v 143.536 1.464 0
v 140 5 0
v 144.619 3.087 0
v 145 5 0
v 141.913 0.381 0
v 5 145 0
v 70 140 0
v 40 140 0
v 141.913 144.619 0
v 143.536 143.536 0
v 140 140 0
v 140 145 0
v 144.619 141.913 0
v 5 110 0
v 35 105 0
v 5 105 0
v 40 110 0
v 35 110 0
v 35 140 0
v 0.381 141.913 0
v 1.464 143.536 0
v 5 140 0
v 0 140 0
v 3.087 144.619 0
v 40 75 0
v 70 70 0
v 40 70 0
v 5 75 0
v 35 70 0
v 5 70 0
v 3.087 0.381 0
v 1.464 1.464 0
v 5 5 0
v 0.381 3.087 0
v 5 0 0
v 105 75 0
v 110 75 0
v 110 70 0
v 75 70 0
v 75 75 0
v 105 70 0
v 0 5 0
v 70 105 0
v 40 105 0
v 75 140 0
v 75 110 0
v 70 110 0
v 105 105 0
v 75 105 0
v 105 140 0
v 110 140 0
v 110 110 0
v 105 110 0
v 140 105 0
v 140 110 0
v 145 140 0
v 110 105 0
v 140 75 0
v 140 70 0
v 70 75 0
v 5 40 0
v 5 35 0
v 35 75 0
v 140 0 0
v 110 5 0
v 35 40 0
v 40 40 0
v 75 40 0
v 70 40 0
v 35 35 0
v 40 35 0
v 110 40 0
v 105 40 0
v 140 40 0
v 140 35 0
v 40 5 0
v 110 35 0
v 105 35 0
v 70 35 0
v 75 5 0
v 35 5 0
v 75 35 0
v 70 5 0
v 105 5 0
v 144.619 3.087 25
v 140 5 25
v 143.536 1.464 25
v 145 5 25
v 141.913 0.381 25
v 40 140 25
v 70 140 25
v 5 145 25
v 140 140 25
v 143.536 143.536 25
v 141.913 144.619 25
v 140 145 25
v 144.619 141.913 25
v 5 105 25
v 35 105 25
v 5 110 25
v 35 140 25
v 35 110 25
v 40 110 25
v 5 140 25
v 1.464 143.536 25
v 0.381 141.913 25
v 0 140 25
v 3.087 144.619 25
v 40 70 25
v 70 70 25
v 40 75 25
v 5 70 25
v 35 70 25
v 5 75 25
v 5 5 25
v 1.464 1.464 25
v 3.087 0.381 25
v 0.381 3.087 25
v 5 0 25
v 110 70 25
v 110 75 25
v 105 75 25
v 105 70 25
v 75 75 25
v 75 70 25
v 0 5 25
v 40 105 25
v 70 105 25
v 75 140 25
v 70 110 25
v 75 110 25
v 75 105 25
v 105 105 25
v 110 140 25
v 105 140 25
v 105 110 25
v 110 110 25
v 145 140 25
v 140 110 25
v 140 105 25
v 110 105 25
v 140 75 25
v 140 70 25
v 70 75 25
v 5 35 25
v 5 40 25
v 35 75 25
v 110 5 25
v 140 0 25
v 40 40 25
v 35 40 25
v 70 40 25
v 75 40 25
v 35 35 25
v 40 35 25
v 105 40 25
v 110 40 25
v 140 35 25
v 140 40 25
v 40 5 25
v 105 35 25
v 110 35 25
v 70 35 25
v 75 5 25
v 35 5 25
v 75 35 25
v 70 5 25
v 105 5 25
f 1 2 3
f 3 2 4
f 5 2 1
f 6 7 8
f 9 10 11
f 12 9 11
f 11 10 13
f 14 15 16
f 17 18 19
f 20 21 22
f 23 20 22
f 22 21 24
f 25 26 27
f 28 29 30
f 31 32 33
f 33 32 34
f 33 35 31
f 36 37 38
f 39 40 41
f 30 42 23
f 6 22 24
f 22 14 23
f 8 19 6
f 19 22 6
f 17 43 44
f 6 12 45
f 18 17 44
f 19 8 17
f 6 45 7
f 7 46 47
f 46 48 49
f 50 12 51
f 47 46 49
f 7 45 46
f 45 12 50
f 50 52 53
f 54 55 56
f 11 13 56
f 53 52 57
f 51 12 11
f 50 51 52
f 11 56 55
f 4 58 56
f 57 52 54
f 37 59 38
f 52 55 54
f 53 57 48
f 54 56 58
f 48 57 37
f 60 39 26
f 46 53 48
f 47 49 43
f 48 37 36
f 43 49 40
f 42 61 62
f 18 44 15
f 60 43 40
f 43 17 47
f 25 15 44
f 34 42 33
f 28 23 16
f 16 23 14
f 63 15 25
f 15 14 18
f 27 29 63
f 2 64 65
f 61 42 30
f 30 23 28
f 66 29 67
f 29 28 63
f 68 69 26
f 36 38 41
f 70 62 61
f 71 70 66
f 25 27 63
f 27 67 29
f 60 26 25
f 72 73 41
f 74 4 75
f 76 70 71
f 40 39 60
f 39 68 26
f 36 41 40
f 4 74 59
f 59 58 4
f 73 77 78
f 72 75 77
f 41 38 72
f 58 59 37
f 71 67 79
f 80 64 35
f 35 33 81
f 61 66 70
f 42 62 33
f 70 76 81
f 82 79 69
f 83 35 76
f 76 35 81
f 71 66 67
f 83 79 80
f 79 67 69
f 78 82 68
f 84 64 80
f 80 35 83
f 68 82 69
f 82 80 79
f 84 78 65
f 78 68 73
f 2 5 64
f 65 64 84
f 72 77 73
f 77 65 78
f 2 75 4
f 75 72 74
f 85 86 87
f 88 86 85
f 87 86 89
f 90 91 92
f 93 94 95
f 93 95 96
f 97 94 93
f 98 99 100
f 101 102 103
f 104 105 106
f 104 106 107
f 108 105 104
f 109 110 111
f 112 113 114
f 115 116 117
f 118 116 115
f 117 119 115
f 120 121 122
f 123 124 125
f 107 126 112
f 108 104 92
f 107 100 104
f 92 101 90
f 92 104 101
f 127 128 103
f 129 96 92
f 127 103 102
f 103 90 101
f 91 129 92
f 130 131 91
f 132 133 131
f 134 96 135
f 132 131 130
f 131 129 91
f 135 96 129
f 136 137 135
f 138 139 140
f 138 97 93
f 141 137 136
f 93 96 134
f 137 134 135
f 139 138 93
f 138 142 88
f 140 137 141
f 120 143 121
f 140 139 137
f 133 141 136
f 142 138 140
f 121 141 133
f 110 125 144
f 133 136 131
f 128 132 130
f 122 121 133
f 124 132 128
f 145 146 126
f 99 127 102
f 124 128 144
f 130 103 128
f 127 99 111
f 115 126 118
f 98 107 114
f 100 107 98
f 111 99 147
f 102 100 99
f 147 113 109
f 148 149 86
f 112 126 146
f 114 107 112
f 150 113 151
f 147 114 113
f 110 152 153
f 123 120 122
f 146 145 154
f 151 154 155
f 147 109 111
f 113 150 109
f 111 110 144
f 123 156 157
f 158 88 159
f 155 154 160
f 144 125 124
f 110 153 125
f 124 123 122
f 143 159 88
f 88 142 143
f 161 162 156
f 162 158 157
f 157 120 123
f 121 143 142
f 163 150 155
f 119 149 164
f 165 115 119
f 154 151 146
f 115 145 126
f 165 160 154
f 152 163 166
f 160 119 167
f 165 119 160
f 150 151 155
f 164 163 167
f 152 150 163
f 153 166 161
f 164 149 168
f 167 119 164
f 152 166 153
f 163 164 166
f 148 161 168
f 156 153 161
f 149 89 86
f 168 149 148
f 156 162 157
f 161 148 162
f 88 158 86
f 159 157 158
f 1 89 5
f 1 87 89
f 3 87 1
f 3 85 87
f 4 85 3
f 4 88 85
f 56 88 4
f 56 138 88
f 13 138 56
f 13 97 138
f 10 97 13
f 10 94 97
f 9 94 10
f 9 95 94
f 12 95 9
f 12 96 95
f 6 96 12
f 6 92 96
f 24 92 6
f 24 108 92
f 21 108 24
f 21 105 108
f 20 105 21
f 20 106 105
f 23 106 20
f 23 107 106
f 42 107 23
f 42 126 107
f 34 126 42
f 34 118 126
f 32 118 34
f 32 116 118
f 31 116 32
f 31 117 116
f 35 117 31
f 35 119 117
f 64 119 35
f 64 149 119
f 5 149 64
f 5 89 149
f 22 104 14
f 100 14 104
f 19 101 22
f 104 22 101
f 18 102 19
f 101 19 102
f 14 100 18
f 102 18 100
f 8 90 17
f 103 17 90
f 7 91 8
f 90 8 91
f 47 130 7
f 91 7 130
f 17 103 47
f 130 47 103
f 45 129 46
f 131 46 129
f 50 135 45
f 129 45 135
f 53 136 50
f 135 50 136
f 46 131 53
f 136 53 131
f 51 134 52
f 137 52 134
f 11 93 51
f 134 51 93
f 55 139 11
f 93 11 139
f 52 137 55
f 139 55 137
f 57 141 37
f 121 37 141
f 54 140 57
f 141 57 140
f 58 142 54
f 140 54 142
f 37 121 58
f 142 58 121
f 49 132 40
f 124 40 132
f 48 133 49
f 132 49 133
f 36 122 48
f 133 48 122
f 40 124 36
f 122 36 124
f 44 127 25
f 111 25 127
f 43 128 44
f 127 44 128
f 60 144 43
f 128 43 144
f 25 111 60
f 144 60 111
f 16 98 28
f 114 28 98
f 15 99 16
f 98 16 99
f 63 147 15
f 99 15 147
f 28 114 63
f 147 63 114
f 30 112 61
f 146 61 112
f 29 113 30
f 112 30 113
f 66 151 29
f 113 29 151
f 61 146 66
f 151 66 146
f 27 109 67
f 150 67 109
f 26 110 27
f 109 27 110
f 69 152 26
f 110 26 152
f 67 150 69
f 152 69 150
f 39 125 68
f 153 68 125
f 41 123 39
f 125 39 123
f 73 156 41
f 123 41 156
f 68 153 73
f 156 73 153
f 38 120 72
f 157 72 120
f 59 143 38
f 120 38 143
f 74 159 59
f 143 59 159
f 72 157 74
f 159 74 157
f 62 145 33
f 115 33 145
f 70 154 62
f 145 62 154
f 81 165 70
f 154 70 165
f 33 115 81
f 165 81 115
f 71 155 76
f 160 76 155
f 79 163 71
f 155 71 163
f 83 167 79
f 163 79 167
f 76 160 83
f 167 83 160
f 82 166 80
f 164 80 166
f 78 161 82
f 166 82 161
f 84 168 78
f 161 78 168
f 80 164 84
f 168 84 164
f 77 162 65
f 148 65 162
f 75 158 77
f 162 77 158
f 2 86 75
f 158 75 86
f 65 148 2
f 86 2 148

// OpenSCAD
w=140;
h=140;

linear_extrude(height=25, center=false){
  difference(){
    translate([5,5,0]) {
      minkowski(){
        square(size=[w-5,h-5]);
        circle(r=5);
      }
    }

    gap=5;
    color("red"){
      for(i=[0:3])
        for(j=[0:3])
          translate([w/4*i+gap,w/4*j+gap,0])
            square(size=[w/4-gap,h/4-gap]);
    }
  }
}
